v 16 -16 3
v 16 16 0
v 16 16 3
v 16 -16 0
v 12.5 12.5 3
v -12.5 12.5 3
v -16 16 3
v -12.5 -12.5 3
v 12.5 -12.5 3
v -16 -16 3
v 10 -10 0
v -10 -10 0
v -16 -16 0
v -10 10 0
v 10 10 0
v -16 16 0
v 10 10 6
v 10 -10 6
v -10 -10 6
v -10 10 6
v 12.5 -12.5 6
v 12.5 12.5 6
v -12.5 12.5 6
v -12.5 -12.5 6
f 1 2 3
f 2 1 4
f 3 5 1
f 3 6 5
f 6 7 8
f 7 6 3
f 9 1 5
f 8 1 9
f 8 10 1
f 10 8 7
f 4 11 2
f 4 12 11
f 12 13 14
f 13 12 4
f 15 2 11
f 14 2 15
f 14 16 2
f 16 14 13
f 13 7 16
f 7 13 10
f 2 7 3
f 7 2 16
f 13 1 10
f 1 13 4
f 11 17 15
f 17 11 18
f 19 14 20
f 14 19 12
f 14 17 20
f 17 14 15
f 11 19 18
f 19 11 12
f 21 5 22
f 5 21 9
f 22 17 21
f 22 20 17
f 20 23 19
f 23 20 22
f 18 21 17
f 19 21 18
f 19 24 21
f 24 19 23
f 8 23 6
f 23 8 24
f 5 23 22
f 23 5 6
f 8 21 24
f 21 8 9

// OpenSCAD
tilesize = 24;
wallthickness = 3;

//base
difference() {
translate([0,0,wallthickness/2])
cube([((tilesize+2)+(wallthickness*2)),((tilesize+2)+(wallthickness*2)),wallthickness],true);
translate([0,0,wallthickness/2])    
cube([tilesize-4,tilesize-4,wallthickness*4],true);
}

difference(){
translate([(tilesize+1)/-2,(tilesize+1)/-2,0])
cube([tilesize+1,tilesize+1,wallthickness+3]);

translate([0,0,wallthickness/2])    
cube([tilesize-4,tilesize-4,wallthickness*4],true);
}
